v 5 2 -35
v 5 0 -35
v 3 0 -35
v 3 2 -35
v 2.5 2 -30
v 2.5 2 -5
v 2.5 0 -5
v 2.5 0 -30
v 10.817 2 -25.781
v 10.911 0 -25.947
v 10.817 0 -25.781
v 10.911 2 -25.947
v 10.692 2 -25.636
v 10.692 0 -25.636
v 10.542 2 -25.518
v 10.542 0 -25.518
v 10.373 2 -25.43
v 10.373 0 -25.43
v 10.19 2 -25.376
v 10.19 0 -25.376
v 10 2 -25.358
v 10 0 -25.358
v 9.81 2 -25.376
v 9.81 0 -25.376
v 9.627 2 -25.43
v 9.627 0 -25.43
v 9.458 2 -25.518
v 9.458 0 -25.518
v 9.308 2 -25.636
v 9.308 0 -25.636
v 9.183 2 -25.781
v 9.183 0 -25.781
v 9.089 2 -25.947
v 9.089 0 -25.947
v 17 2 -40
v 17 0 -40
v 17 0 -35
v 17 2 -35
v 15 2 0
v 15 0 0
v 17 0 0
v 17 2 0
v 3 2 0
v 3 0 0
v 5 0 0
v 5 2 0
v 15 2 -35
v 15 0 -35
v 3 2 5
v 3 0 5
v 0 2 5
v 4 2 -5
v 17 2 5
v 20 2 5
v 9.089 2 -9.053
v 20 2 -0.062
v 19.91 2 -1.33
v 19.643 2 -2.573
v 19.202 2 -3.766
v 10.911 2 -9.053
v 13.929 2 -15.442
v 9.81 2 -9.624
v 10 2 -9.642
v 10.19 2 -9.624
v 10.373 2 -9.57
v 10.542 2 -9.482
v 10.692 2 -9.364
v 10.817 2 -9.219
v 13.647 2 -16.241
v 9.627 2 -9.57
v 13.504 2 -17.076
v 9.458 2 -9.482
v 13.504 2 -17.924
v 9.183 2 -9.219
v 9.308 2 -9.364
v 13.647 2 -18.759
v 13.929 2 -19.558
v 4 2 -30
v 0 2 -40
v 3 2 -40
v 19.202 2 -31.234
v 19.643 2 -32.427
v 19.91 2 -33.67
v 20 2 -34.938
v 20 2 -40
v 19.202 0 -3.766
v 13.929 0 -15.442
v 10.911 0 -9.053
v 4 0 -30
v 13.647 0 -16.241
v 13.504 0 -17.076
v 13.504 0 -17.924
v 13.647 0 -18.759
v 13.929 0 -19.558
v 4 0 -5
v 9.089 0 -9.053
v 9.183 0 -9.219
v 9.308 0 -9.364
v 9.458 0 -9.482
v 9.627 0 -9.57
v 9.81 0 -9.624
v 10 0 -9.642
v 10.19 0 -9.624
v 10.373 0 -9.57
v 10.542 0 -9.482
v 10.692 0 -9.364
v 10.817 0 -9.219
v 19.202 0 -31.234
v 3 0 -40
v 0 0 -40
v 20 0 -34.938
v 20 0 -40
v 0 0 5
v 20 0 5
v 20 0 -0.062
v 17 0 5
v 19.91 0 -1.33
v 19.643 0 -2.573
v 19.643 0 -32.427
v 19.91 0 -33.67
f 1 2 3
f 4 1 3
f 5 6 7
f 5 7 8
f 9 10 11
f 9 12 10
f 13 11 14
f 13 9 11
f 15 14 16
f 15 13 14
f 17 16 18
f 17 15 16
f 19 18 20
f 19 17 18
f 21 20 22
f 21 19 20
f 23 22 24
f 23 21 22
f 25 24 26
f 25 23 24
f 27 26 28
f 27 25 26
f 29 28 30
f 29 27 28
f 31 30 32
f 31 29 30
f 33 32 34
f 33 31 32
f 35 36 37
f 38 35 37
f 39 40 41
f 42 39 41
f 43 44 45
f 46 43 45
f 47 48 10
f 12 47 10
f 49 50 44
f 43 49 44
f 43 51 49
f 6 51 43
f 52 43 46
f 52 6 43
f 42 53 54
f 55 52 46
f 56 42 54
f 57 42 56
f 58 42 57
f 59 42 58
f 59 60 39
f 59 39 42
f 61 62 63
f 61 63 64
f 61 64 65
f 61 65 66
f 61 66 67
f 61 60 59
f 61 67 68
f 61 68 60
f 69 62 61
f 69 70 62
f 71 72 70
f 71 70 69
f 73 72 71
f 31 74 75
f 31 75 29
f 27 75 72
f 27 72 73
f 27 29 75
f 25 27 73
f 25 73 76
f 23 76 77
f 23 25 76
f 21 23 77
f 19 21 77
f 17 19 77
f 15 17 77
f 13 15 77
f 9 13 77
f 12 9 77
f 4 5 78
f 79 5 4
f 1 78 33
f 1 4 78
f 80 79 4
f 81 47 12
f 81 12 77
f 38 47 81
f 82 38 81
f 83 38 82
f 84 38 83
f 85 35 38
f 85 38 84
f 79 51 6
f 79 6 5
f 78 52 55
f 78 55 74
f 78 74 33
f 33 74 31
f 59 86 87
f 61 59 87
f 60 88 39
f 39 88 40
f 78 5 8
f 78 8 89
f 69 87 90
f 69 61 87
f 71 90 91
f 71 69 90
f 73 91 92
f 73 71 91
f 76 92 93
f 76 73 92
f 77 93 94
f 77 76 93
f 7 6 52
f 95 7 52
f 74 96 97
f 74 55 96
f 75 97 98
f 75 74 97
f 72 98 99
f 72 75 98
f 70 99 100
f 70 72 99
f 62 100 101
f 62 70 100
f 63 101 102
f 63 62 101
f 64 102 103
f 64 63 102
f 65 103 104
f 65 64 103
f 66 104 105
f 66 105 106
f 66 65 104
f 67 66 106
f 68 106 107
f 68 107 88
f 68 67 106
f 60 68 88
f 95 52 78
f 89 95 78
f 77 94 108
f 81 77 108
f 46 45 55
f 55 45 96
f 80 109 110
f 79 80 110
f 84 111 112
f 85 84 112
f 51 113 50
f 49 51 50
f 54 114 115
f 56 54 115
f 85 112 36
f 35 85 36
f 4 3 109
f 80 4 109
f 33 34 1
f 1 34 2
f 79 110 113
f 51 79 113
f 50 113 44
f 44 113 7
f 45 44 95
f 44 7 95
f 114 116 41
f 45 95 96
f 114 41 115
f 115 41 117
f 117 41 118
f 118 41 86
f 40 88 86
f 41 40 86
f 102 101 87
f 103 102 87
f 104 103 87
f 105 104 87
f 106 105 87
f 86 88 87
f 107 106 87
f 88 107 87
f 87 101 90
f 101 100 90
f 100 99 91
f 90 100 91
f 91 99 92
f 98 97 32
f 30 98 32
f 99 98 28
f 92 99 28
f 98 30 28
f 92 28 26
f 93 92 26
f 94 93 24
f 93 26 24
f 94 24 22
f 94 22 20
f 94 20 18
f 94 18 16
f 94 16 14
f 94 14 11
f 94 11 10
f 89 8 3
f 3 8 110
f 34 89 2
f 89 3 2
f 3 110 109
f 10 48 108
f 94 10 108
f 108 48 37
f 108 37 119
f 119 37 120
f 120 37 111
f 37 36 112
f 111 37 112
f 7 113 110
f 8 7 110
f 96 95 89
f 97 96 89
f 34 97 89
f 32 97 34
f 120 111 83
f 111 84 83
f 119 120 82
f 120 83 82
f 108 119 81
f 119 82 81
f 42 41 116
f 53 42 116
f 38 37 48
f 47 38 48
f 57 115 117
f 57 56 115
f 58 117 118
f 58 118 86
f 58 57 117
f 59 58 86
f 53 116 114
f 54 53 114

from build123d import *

# Parameters (mm, degrees)
BOSS_EXTRUDE1_DEPTH = 2
FILLET1_R           = 1
FILLET2_R           = 5
FILLET3_R           = 9
BOSS_EXTRUDE2_DEPTH = 2
SKETCH3_W           = 1.5
SKETCH3_H           = 25
CUT_EXTRUDE1_DEPTH  = 2


with BuildPart() as part:
    # Sketch1 → Boss-Extrude1 (new body)
    with BuildSketch(Plane(origin=(0, 0, 0), x_dir=(1, 0, 0), z_dir=(0, 1, 0))):
        Polygon((3, 0), (5, 0), (10, 11.071428571), (15, 0), (17, 0), (17, -5), (20, -5), (20, 0), (20, 2), (13, 17.5), (20, 33), (20, 35), (20, 40), (17, 40), (17, 35), (15, 35), (10, 23.928571429), (5, 35), (3, 35), (3, 40), (0, 40), (0, 35), (0, 33), (7, 17.5), (0, 2), (0, 0), (0, -5), (3, -5), align=None)
    extrude(amount=BOSS_EXTRUDE1_DEPTH)

    # Fillet1
    fillet1_edges = [part.edges().sort_by_distance(p)[0] for p in [
        (10, 1, -23.928571429),
        (10, 1, -11.071428571),
    ]]
    fillet(fillet1_edges, radius=FILLET1_R)

    # Fillet2
    fillet2_edges = [part.edges().sort_by_distance(p)[0] for p in [
        (7, 1, -17.5),
        (13, 1, -17.5),
    ]]
    fillet(fillet2_edges, radius=FILLET2_R)

    # Fillet3
    fillet3_edges = [part.edges().sort_by_distance(p)[0] for p in [
        (0, 1, -2),
        (0, 1, -33),
        (20, 1, -33),
        (20, 1, -2),
    ]]
    fillet(fillet3_edges, radius=FILLET3_R)

    # Sketch2 → Boss-Extrude2 (add)
    with BuildSketch(Plane(origin=(0, 2, 0), x_dir=(1, 0, 0), z_dir=(0, 1, 0))):
        Polygon((3, 35), (0, 35), (0, 0), (3, 0), (9.069161159, 17.5), align=None)
    extrude(amount=-BOSS_EXTRUDE2_DEPTH)

    # Sketch3 → Cut-Extrude1 (cut)
    with BuildSketch(Plane(origin=(0, 2, 0), x_dir=(1, 0, 0), z_dir=(0, 1, 0))):
        with Locations((3.25, 17.5)):
            Rectangle(SKETCH3_W, SKETCH3_H)
    extrude(amount=-CUT_EXTRUDE1_DEPTH, mode=Mode.SUBTRACT)


solid = part.part
